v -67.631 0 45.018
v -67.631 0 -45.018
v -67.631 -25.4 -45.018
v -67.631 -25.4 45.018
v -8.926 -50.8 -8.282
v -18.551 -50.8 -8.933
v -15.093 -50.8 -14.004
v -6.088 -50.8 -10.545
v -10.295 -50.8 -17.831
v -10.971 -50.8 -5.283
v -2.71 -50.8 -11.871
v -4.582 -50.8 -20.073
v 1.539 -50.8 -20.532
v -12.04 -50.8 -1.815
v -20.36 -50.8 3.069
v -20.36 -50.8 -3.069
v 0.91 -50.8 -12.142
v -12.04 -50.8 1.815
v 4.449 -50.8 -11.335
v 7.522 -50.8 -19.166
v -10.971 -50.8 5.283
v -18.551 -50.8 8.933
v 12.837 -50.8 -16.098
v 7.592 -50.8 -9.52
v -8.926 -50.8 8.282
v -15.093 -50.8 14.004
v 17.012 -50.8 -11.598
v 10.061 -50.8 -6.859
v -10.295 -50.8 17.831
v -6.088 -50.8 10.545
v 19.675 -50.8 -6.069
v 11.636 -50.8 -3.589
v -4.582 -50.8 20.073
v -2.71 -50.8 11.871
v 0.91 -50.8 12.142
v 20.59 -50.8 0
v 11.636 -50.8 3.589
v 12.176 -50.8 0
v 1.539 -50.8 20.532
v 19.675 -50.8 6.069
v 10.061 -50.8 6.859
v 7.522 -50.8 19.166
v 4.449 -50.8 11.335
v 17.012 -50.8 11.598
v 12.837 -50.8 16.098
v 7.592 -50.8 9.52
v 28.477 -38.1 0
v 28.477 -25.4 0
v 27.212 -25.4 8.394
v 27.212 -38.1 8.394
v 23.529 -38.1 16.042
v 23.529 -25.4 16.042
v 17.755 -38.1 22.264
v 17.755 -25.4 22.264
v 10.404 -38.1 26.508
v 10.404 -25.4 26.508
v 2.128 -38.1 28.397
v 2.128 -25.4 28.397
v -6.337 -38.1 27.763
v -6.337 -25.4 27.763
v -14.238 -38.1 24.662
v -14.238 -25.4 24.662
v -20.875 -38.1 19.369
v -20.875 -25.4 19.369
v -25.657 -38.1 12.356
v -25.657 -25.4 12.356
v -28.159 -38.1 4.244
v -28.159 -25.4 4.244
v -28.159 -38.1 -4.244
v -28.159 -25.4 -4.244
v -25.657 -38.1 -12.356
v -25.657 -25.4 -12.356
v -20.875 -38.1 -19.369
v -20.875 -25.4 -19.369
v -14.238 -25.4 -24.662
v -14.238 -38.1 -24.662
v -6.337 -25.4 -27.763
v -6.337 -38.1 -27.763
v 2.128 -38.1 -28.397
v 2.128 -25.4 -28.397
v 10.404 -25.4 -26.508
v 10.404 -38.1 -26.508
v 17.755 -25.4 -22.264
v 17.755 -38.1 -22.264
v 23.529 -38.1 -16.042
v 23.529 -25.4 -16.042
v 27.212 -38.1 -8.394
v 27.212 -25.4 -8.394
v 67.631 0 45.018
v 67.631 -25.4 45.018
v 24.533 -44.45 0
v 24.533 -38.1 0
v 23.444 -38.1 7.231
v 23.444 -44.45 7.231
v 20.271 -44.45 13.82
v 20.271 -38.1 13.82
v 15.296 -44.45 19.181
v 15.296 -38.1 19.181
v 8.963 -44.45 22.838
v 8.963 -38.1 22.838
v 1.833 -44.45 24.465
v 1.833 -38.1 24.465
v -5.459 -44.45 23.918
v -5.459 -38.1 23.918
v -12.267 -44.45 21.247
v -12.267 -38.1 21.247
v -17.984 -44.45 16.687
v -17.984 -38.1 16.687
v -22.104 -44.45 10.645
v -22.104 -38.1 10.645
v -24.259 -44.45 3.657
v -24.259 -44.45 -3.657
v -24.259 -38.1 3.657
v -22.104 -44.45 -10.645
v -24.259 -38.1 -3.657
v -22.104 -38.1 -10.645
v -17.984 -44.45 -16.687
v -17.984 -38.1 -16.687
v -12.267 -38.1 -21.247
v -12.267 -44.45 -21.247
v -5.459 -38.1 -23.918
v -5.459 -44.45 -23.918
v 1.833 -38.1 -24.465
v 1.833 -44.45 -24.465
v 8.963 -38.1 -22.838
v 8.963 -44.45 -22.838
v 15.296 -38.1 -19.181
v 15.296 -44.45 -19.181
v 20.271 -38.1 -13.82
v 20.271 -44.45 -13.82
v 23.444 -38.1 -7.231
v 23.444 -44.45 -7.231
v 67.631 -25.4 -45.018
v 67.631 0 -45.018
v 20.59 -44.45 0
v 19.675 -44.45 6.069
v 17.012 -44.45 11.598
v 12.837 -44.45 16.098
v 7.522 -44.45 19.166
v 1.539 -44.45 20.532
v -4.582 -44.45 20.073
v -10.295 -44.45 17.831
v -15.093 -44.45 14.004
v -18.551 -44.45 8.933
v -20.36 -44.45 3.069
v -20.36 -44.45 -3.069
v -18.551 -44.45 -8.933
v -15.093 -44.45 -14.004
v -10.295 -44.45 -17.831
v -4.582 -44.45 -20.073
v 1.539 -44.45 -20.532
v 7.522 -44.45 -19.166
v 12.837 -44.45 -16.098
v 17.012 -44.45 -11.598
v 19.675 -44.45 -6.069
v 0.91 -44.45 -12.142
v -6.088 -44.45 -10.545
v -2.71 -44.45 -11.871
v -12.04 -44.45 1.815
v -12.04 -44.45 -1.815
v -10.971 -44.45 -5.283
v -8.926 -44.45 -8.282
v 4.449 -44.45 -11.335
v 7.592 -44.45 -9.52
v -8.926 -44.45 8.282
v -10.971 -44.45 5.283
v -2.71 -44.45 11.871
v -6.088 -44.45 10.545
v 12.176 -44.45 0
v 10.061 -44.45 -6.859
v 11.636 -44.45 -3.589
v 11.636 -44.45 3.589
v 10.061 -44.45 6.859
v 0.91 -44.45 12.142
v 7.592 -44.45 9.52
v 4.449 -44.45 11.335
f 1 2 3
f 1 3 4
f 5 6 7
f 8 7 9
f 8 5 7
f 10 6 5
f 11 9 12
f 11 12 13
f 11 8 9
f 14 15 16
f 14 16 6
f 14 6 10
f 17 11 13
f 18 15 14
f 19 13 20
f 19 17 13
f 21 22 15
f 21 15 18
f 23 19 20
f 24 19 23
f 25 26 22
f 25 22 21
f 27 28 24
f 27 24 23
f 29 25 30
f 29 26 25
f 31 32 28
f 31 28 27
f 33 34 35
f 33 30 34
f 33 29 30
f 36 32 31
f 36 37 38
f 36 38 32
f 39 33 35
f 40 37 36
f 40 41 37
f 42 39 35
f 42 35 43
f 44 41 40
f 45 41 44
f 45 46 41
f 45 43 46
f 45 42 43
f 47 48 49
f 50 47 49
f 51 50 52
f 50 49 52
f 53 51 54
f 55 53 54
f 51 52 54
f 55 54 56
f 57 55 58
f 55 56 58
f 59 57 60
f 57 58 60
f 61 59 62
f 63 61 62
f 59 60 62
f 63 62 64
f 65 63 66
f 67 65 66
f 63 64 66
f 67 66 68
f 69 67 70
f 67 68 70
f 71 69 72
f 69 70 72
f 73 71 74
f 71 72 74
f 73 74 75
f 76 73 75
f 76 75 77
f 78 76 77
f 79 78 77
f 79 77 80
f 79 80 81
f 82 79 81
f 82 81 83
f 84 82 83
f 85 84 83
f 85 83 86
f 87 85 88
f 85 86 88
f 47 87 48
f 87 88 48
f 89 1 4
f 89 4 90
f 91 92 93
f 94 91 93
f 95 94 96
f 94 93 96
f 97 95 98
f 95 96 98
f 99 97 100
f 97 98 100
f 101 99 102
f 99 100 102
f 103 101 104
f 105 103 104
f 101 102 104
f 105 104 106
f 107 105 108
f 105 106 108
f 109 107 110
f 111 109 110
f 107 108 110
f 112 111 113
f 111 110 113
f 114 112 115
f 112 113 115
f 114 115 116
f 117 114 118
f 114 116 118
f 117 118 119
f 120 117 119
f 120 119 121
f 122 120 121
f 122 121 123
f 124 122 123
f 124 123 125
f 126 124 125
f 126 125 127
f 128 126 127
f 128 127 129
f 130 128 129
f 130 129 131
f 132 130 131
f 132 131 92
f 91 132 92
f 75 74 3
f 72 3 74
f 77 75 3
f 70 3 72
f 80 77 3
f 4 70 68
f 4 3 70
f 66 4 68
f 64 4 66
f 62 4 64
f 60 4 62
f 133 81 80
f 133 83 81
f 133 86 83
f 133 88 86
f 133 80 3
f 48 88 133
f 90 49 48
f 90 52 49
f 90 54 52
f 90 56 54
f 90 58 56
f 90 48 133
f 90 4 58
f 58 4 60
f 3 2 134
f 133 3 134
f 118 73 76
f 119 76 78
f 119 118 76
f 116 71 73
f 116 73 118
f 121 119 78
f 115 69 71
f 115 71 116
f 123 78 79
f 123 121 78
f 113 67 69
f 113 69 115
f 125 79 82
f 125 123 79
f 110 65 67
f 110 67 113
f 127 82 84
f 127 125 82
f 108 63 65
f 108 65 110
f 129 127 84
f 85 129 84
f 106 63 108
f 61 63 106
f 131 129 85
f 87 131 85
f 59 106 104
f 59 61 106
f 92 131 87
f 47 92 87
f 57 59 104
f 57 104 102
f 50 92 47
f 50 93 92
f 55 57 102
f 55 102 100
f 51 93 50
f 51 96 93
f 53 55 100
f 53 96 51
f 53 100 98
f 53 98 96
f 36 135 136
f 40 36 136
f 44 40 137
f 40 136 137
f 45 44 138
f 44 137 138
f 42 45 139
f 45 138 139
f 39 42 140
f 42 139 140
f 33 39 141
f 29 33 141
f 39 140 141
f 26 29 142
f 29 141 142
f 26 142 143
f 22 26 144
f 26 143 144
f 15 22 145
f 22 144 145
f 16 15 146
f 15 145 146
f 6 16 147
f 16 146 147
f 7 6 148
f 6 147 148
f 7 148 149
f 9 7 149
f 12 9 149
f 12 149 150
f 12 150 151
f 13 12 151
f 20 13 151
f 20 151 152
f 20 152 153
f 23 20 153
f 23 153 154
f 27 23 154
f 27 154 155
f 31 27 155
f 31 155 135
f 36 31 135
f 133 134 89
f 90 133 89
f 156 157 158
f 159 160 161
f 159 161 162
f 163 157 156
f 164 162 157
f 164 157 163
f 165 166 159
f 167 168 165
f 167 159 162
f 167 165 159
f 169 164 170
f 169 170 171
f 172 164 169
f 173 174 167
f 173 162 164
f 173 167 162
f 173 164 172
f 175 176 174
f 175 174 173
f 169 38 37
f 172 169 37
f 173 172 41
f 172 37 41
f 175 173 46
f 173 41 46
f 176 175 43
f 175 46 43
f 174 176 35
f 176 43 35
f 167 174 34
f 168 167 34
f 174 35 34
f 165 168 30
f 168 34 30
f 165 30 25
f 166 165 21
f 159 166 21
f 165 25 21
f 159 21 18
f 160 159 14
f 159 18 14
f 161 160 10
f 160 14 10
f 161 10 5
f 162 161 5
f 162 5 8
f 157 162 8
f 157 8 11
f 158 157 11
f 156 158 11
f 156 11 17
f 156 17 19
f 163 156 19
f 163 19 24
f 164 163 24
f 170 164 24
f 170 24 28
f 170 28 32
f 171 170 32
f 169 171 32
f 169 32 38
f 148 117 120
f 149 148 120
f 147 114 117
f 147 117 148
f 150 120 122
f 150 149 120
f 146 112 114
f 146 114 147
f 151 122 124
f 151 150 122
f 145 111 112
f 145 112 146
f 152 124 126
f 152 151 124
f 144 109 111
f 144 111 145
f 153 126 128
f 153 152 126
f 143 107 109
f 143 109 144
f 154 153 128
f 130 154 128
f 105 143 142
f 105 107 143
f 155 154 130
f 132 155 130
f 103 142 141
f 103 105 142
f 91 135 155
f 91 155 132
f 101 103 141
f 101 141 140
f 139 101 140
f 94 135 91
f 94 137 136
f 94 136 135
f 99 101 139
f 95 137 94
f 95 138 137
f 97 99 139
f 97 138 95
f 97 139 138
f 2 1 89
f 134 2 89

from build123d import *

# Parameters (mm, degrees)
F0_W      = 135.262012
F0_H      = 90.036332
F1_DEPTH  = 25.4
F2_R      = 20.589532
F4_DEPTH  = 25.4
F3_R      = 10.44105
F5_DEPTH  = 38.1
F7_R      = 12.176484
F8_DEPTH  = 25.4
F9_R      = 24.533487
F10_DEPTH = 19.05
F11_R     = 28.476811
F12_DEPTH = 12.7


with BuildPart() as f1:
    # F0 (on Front) → F1 (new body)
    with BuildSketch(Plane.XZ):
        Rectangle(F0_W, F0_H)
    extrude(amount=F1_DEPTH)

    # F2 (on face) → F4 (join)
    with BuildSketch(Plane.XZ.offset(25.4)):
        Circle(F2_R)
    extrude(amount=F4_DEPTH)

    # F3 (on Front) → F5 (join)
    with BuildSketch(Plane.XZ):
        Circle(F3_R)
    extrude(amount=F5_DEPTH)

    # F7 (on face) → F8 (cut)
    with BuildSketch(Plane.XZ.offset(50.8)):
        Circle(F7_R)
    extrude(amount=-F8_DEPTH, mode=Mode.SUBTRACT)

    # F9 (on face) → F10 (join)
    with BuildSketch(Plane.XZ.offset(25.4)):
        Circle(F9_R)
    extrude(amount=F10_DEPTH)

    # F11 (on face) → F12 (join)
    with BuildSketch(Plane.XZ.offset(25.4)):
        Circle(F11_R)
    extrude(amount=F12_DEPTH)


solid = f1.part
